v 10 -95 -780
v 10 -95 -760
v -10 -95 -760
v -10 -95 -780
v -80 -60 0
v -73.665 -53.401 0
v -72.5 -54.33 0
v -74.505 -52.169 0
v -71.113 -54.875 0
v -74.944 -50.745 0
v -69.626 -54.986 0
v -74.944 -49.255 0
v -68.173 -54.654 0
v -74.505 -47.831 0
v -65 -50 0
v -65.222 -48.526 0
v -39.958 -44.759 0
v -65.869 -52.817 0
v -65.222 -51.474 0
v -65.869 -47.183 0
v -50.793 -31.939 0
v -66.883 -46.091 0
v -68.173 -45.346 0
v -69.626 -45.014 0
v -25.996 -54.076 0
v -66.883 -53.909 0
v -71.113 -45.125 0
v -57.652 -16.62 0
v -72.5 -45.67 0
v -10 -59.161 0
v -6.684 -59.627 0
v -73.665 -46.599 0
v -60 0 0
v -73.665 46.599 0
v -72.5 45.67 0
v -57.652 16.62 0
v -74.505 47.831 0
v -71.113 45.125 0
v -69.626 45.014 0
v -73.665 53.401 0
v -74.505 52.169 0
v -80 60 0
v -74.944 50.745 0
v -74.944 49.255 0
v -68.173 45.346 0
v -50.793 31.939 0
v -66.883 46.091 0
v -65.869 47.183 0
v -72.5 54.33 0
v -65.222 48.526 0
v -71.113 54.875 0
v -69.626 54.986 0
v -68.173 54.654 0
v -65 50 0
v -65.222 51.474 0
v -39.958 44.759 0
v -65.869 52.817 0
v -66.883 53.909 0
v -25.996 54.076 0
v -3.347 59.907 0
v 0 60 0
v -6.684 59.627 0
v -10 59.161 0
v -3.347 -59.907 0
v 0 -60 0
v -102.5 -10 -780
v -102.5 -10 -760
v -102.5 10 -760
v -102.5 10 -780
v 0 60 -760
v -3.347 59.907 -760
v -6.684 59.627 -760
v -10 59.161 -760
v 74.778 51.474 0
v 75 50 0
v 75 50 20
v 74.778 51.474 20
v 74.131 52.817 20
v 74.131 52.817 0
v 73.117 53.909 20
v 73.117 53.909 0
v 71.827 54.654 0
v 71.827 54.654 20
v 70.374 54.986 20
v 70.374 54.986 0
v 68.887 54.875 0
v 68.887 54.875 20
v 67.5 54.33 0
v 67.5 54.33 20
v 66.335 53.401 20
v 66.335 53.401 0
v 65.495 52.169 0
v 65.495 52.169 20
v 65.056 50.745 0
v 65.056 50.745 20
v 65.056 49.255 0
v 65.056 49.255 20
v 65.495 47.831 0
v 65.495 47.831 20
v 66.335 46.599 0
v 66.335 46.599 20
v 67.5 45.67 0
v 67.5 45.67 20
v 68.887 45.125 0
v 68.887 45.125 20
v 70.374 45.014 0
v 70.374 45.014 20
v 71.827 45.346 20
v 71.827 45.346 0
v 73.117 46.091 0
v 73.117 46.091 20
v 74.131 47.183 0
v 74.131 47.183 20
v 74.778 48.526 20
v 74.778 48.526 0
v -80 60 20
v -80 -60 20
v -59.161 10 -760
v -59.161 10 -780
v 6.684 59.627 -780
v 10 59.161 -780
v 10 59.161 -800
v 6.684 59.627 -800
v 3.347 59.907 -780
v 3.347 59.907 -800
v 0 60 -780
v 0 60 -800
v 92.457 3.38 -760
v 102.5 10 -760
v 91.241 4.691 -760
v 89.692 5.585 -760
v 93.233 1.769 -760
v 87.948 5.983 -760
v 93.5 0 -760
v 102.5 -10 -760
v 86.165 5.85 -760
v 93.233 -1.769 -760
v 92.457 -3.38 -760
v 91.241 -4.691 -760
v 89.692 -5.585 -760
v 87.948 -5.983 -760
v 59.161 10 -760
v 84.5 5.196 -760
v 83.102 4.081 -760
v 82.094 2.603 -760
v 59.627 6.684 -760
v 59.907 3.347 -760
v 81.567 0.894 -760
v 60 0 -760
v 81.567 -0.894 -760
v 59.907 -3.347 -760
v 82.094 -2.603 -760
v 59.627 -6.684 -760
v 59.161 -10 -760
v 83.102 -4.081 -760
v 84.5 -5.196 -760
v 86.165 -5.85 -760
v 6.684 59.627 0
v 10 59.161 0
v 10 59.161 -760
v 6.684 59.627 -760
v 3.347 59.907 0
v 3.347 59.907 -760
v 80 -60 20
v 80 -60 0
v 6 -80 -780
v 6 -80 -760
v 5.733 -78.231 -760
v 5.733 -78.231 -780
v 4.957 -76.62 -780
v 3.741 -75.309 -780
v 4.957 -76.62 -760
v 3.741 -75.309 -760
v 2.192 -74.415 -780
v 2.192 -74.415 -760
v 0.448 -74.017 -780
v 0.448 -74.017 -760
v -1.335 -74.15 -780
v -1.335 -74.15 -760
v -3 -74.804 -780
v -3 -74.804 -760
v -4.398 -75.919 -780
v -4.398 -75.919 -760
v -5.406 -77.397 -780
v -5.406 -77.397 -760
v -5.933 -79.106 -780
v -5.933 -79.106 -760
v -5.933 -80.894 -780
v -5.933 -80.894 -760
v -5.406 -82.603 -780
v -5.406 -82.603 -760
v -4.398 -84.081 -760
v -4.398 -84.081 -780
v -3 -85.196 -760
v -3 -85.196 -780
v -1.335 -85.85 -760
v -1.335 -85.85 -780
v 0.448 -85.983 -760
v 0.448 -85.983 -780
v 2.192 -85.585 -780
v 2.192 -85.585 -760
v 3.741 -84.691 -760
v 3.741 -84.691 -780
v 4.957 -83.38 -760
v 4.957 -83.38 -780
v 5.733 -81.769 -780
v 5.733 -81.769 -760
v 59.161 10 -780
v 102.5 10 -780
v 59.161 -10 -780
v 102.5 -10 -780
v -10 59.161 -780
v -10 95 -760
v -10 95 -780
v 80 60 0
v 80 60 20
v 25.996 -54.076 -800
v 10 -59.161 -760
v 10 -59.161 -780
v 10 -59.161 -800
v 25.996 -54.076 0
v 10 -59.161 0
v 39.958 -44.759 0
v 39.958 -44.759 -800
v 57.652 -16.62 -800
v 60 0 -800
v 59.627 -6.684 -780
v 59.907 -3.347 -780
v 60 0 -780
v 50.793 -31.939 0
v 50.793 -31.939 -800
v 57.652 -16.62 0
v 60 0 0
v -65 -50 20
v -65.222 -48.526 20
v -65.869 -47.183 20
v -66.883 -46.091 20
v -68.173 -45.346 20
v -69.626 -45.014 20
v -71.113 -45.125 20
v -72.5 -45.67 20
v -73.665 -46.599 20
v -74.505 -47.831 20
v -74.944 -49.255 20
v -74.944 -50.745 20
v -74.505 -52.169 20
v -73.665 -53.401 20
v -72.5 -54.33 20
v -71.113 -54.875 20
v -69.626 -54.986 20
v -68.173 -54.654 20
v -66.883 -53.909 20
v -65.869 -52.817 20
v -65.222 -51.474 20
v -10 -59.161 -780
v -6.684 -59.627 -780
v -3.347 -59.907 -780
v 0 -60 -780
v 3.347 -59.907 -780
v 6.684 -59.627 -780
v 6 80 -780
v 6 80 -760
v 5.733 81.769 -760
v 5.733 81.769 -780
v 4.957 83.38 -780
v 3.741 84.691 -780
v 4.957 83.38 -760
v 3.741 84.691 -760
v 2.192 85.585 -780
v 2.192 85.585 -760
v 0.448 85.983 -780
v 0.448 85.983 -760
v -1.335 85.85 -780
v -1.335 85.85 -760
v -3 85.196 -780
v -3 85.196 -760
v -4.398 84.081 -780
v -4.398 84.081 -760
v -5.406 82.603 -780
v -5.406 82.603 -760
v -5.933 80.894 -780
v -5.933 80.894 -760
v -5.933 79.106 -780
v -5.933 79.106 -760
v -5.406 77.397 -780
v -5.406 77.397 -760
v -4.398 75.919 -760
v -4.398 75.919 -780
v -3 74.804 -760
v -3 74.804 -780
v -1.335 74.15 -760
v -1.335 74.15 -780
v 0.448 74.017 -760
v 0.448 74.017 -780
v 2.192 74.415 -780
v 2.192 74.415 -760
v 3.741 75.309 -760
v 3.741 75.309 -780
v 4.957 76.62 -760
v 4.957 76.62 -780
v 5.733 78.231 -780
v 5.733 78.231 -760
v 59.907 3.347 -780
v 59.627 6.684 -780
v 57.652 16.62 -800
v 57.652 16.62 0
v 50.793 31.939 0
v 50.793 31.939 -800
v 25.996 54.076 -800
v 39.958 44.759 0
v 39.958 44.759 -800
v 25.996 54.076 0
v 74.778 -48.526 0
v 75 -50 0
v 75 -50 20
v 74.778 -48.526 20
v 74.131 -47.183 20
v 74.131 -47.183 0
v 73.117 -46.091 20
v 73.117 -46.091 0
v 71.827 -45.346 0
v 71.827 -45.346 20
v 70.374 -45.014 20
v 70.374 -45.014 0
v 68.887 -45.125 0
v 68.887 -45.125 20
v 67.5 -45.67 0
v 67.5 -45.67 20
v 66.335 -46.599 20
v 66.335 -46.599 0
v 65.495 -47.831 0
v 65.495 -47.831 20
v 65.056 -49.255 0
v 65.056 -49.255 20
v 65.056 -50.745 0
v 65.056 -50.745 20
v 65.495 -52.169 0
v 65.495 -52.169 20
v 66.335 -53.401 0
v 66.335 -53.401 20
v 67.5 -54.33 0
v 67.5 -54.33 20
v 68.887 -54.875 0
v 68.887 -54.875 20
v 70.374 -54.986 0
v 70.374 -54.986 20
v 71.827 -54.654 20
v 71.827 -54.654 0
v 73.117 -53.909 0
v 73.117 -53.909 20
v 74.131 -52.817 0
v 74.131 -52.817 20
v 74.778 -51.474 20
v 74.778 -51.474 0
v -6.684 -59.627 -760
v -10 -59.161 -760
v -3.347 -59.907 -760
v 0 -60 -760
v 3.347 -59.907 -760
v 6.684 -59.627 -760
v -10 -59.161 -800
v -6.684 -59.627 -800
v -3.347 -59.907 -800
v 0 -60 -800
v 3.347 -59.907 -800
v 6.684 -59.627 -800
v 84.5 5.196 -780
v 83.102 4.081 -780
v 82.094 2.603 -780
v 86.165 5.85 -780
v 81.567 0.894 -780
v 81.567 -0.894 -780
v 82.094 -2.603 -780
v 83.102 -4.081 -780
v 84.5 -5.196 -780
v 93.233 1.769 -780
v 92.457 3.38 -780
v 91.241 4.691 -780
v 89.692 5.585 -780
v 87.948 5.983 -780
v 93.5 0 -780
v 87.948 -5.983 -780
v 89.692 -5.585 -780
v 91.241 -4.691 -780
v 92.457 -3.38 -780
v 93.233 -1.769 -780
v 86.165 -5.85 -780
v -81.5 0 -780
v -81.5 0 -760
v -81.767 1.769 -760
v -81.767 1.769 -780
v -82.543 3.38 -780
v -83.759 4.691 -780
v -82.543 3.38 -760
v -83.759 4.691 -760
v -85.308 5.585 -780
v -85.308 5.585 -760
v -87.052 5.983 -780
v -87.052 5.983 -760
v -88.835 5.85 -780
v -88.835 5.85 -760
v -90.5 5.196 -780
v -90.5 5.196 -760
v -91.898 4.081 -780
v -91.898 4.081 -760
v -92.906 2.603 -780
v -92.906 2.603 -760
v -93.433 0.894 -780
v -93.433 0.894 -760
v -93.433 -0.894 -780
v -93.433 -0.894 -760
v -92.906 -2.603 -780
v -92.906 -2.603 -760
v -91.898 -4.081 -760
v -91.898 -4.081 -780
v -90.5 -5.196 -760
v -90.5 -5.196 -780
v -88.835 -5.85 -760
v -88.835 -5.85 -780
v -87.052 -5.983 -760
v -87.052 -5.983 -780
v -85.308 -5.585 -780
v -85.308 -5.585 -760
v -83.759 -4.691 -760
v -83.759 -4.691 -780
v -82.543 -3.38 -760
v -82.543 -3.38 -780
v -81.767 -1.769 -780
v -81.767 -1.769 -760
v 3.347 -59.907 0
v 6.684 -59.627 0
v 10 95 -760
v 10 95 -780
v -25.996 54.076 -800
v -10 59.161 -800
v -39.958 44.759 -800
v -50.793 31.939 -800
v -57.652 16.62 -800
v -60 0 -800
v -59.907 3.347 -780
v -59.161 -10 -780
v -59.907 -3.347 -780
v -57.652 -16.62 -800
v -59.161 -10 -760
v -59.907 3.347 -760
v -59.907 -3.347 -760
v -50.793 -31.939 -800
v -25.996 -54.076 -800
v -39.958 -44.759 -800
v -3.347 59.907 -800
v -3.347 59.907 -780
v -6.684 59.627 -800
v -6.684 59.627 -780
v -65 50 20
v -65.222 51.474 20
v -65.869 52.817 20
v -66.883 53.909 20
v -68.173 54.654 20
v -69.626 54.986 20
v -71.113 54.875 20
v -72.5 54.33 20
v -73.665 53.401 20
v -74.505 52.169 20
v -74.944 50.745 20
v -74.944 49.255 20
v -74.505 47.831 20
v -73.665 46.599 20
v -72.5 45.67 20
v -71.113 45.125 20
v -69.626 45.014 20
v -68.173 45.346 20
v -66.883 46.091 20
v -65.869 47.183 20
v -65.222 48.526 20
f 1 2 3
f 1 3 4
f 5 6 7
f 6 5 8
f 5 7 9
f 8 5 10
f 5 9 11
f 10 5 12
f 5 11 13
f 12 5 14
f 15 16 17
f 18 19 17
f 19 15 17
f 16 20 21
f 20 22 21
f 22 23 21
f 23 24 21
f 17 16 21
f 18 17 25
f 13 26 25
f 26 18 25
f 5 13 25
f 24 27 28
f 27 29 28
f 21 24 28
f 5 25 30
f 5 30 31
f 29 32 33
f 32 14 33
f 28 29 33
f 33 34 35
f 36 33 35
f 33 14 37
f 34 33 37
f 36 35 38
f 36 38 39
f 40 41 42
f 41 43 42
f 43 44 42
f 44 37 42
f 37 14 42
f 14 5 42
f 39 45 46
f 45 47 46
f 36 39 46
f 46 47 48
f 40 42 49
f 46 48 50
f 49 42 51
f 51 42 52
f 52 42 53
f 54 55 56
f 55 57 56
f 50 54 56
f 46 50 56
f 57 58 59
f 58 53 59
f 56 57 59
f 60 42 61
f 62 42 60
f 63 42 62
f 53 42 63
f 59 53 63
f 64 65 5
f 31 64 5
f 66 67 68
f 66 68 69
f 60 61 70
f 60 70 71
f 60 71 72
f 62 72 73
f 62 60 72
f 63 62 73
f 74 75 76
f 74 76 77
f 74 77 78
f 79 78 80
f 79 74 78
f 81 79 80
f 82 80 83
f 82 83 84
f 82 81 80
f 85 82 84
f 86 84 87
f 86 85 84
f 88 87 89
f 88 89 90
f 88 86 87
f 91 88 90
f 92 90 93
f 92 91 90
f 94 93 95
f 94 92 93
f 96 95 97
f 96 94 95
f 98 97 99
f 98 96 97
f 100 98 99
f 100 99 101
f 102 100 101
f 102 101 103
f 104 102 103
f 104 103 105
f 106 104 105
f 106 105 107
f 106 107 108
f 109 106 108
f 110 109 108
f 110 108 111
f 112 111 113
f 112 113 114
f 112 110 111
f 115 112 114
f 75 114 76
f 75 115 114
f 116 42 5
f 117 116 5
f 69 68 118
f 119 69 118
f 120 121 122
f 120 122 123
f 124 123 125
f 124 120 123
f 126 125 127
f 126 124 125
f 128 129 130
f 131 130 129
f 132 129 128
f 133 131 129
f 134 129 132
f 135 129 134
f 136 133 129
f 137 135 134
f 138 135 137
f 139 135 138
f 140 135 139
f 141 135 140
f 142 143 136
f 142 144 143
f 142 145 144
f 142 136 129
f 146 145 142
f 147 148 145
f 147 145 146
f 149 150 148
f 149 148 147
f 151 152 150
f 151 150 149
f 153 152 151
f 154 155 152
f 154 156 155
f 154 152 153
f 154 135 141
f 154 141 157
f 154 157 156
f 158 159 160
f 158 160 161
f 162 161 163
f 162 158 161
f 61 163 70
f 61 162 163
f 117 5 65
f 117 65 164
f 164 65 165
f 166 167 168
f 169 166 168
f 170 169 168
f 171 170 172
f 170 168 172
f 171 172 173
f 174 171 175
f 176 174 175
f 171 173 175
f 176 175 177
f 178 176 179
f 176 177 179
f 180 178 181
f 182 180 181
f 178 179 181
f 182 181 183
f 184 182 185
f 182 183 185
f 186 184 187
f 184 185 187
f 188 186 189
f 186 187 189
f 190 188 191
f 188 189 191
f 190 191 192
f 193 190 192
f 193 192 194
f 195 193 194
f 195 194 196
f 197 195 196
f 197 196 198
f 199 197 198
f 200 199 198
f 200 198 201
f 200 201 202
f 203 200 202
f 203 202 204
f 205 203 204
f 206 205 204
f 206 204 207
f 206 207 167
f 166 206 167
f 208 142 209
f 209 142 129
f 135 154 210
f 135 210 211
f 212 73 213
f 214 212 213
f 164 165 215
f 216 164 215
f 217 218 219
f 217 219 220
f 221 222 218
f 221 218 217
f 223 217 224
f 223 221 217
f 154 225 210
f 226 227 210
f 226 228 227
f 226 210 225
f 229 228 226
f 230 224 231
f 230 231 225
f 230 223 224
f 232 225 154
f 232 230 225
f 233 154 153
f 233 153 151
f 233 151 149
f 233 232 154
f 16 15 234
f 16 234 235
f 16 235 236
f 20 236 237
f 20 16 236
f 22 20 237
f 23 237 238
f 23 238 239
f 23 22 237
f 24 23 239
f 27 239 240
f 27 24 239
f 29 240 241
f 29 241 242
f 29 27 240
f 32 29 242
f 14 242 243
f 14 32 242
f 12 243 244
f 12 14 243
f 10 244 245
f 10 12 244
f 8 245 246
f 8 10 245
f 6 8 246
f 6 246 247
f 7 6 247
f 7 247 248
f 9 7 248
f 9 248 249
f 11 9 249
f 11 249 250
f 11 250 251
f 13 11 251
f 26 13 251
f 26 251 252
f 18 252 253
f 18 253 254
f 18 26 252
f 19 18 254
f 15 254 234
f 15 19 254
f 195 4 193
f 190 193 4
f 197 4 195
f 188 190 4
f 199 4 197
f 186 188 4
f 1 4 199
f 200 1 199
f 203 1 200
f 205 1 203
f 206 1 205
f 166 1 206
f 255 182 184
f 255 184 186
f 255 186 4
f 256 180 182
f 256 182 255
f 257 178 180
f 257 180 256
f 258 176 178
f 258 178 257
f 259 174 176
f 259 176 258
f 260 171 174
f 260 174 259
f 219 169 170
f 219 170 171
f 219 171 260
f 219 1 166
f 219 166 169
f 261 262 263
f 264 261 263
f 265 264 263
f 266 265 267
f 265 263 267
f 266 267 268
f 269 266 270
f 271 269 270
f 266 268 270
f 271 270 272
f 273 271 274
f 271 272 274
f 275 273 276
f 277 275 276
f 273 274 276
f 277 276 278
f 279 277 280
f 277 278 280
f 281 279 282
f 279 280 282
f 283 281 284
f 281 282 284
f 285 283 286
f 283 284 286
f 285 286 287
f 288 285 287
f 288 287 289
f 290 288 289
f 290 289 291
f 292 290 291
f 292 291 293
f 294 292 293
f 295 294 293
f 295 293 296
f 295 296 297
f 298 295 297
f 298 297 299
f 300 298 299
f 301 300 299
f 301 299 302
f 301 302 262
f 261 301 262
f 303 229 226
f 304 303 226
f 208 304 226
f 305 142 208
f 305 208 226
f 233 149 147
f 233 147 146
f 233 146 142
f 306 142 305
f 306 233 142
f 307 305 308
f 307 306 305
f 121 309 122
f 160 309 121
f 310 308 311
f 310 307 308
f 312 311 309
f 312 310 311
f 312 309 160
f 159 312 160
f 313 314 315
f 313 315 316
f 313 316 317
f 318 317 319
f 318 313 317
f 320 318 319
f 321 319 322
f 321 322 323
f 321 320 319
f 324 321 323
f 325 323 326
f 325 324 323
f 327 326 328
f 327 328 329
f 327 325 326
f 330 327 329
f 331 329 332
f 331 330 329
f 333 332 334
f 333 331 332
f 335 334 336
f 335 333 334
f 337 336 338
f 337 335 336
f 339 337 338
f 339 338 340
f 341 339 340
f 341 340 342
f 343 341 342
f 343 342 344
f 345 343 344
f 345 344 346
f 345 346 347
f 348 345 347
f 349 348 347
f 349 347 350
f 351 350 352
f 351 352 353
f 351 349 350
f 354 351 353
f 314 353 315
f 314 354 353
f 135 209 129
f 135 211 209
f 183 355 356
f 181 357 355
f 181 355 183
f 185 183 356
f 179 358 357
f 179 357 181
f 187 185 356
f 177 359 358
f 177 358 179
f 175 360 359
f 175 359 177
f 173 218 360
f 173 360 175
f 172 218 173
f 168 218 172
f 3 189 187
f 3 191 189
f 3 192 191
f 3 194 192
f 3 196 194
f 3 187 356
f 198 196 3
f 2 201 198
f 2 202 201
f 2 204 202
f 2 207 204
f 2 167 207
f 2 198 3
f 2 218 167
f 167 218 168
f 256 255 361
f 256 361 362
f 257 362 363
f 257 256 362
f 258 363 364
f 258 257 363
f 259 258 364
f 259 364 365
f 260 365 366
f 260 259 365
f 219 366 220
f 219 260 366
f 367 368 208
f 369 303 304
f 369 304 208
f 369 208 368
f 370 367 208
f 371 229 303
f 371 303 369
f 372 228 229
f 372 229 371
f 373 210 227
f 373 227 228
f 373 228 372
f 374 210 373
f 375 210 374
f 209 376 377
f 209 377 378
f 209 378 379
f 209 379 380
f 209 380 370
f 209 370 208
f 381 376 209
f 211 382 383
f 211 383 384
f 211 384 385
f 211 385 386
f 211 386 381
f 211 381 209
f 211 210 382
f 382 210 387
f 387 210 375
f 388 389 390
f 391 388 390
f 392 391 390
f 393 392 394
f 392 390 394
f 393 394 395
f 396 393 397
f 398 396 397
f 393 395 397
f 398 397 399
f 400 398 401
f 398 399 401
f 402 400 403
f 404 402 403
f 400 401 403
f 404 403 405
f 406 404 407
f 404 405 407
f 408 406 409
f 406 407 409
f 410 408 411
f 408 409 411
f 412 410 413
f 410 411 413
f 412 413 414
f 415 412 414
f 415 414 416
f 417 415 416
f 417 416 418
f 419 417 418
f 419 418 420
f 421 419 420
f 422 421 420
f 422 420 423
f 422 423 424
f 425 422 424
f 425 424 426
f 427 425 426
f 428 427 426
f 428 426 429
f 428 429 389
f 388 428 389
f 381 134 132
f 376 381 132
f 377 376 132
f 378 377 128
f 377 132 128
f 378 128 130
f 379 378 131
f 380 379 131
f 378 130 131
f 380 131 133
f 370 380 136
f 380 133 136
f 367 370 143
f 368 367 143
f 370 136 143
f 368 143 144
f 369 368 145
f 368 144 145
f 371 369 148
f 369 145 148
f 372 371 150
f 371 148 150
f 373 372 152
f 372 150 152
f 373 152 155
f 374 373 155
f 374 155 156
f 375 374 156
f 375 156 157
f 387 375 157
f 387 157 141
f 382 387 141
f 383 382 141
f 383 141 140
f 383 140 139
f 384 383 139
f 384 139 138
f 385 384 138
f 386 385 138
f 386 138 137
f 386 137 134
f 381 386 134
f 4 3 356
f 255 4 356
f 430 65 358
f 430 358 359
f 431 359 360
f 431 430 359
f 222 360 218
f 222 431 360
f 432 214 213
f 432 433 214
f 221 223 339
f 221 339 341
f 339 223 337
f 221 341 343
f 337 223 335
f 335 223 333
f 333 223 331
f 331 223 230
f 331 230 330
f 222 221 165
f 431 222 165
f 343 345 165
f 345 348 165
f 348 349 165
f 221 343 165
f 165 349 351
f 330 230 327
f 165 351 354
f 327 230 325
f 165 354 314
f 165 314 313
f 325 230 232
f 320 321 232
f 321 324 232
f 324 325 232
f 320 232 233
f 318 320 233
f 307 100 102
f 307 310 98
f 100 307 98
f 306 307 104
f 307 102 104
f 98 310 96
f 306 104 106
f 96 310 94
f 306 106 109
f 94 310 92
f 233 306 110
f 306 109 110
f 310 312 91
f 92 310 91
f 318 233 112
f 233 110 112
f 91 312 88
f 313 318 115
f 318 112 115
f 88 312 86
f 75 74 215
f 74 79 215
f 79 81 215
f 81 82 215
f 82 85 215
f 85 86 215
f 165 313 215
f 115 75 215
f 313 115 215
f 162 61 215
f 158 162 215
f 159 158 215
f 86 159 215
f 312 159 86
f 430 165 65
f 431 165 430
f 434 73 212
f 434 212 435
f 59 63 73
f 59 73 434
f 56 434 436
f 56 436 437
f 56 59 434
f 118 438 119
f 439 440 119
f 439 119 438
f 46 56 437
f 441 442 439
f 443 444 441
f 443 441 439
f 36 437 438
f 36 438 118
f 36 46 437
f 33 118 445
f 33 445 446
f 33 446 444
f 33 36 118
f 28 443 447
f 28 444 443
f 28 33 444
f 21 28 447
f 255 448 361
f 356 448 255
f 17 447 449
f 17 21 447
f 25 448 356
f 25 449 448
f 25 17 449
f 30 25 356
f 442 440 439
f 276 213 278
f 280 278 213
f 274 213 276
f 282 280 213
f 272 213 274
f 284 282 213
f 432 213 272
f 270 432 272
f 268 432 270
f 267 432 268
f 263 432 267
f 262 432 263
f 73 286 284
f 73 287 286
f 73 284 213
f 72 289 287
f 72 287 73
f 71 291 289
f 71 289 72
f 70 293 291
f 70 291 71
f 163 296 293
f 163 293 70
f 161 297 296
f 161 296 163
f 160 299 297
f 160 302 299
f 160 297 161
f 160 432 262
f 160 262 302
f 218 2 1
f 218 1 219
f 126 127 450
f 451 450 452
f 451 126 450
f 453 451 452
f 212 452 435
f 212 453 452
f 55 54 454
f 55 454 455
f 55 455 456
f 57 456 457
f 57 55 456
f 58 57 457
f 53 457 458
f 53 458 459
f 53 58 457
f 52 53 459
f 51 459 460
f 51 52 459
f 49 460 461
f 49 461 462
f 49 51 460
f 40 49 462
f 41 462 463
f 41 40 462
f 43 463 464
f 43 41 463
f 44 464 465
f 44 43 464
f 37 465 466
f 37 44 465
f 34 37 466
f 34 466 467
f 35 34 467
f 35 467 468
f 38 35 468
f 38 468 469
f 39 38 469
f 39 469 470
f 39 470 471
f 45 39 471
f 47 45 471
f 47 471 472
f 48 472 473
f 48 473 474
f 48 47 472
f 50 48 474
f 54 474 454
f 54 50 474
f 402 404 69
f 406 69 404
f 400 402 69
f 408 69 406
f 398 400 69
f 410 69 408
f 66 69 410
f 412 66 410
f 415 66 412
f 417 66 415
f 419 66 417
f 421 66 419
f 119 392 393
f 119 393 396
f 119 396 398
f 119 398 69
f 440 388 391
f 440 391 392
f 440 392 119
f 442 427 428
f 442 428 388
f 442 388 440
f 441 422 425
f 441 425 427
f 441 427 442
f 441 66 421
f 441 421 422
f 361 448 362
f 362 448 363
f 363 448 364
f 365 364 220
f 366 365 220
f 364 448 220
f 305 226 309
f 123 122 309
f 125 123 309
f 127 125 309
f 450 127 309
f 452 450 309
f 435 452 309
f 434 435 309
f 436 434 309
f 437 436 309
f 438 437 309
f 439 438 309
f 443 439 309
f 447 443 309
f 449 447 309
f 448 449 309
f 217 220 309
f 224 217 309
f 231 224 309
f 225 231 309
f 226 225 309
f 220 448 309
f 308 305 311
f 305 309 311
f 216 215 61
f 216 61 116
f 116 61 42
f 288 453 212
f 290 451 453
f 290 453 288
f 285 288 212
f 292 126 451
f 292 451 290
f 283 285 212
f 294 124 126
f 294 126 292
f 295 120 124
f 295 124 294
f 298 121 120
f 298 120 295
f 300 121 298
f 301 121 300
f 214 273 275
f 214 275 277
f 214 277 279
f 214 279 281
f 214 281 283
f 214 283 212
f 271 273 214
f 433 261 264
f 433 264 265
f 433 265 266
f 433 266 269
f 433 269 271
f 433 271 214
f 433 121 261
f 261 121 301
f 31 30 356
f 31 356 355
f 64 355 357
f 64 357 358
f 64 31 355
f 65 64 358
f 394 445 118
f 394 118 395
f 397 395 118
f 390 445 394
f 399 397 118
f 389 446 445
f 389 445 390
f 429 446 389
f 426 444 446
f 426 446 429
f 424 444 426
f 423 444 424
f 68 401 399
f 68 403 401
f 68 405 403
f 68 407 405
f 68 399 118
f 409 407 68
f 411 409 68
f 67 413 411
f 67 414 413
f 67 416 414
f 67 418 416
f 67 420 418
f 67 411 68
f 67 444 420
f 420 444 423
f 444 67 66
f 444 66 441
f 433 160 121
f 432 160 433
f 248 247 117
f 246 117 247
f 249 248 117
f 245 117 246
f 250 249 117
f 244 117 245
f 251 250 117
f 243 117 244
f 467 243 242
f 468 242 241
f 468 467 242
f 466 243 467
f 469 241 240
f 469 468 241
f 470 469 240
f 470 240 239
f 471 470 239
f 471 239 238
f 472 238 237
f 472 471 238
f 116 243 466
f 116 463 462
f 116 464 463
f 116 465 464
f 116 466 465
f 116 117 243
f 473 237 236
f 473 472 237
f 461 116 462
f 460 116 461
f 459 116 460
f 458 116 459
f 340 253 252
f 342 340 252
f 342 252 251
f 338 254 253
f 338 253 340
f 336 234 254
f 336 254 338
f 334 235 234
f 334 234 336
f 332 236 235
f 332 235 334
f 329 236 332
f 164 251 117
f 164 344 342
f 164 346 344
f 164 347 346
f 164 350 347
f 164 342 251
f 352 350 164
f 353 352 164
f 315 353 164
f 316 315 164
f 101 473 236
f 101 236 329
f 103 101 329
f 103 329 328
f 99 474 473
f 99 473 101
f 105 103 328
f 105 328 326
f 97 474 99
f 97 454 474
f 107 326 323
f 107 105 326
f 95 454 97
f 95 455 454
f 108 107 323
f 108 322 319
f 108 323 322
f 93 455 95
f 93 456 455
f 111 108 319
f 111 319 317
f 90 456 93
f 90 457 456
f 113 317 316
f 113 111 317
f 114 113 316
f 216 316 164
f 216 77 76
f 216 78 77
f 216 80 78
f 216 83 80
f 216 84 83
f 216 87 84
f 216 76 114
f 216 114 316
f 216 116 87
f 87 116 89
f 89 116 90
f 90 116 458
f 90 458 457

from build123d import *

# Parameters (mm, degrees)
F0_R     = 5
F1_DEPTH = 20
F2_DEPTH = 800
F5_DEPTH = 10
F6_DEPTH = 10
F0_R_2   = 6
F7_DEPTH = 956


# Not quite as in the source:
# - a feature names something its author has since deleted; it is built from what else it names


with BuildPart() as f1:
    # F0 (on Top) → F1 (new body)
    with BuildSketch(Plane.XY):
        with BuildLine():
            ThreePointArc((-59.160797831, 10), (-42.4264068712, 42.4264068712), (-10, 59.160797831))
            Line((-10, 59.160797831), (-10, 60))
            Line((-10, 60), (-80, 60))
            Line((-80, 60), (-80, 10))
            Line((-80, 10), (-59.160797831, 10))
        make_face()
        with Locations((-70, 50)):
            Circle(F0_R, mode=Mode.SUBTRACT)
        with BuildLine():
            ThreePointArc((59.160797831, -10), (59.7898313673, -5.0175756168), (60, 0))
            ThreePointArc((60, 0), (59.7898313673, 5.0175756168), (59.160797831, 10))
            ThreePointArc((59.160797831, 10), (42.4264068712, 42.4264068712), (10, 59.160797831))
            ThreePointArc((10, 59.160797831), (5.0175756193, 59.7898313671), (5e-09, 60))
            ThreePointArc((5e-09, 60), (-5.0175756143, 59.7898313675), (-10, 59.160797831))
            ThreePointArc((-10, 59.160797831), (-42.4264068712, 42.4264068712), (-59.160797831, 10))
            ThreePointArc((-59.160797831, 10), (-60, 0), (-59.160797831, -10))
            ThreePointArc((-59.160797831, -10), (-42.4264068712, -42.4264068712), (-10, -59.160797831))
            ThreePointArc((-10, -59.160797831), (-5.0175756489, -59.7898313646), (-6.44e-08, -60))
            ThreePointArc((-6.44e-08, -60), (5.0175755847, -59.78983137), (10, -59.160797831))
            ThreePointArc((10, -59.160797831), (42.4264068712, -42.4264068712), (59.160797831, -10))
        make_face()
        with BuildLine():
            ThreePointArc((10, 59.160797831), (42.4264068712, 42.4264068712), (59.160797831, 10))
            Line((59.160797831, 10), (80, 10))
            Line((80, 10), (80, 60))
            Line((80, 60), (10, 60))
            Line((10, 60), (10, 59.160797831))
        make_face()
        with Locations((70, 50)):
            Circle(F0_R, mode=Mode.SUBTRACT)
        with BuildLine():
            ThreePointArc((59.160797831, 10), (59.7898313673, 5.0175756168), (60, 0))
            ThreePointArc((60, 0), (59.7898313673, -5.0175756168), (59.160797831, -10))
            Line((59.160797831, -10), (80, -10))
            Line((80, -10), (80, 10))
            Line((80, 10), (59.160797831, 10))
        make_face()
        with BuildLine():
            Line((80, -10), (59.160797831, -10))
            ThreePointArc((59.160797831, -10), (42.4264068712, -42.4264068712), (10, -59.160797831))
            Line((10, -59.160797831), (10, -60))
            Line((10, -60), (80, -60))
            Line((80, -60), (80, -10))
        make_face()
        with Locations((70, -50)):
            Circle(F0_R, mode=Mode.SUBTRACT)
        with BuildLine():
            ThreePointArc((-59.160797831, -10), (-60, 0), (-59.160797831, 10))
            Line((-59.160797831, 10), (-80, 10))
            Line((-80, 10), (-80, -10))
            Line((-80, -10), (-59.160797831, -10))
        make_face()
        with BuildLine():
            Line((-10, -60), (-10, -59.160797831))
            ThreePointArc((-10, -59.160797831), (-42.4264068712, -42.4264068712), (-59.160797831, -10))
            Line((-59.160797831, -10), (-80, -10))
            Line((-80, -10), (-80, -60))
            Line((-80, -60), (-10, -60))
        make_face()
        with Locations((-70, -50)):
            Circle(F0_R, mode=Mode.SUBTRACT)
        with BuildLine():
            Line((-10, -60), (-6.44e-08, -60))
            ThreePointArc((-6.44e-08, -60), (-5.0175756489, -59.7898313646), (-10, -59.160797831))
            Line((-10, -59.160797831), (-10, -60))
        make_face()
        with BuildLine():
            Line((10, -60), (10, -59.160797831))
            ThreePointArc((10, -59.160797831), (5.0175755847, -59.78983137), (-6.44e-08, -60))
            Line((-6.44e-08, -60), (10, -60))
        make_face()
        with BuildLine():
            ThreePointArc((-10, 59.160797831), (-5.0175756143, 59.7898313675), (5e-09, 60))
            Line((5e-09, 60), (-10, 60))
            Line((-10, 60), (-10, 59.160797831))
        make_face()
        with BuildLine():
            ThreePointArc((5e-09, 60), (5.0175756193, 59.7898313671), (10, 59.160797831))
            Line((10, 59.160797831), (10, 60))
            Line((10, 60), (5e-09, 60))
        make_face()
    extrude(amount=F1_DEPTH)

    # F0 (on Top) → F2 (join)
    with BuildSketch(Plane.XY):
        with BuildLine():
            ThreePointArc((59.160797831, -10), (59.7898313673, -5.0175756168), (60, 0))
            ThreePointArc((60, 0), (59.7898313673, 5.0175756168), (59.160797831, 10))
            ThreePointArc((59.160797831, 10), (42.4264068712, 42.4264068712), (10, 59.160797831))
            ThreePointArc((10, 59.160797831), (5.0175756193, 59.7898313671), (5e-09, 60))
            ThreePointArc((5e-09, 60), (-5.0175756143, 59.7898313675), (-10, 59.160797831))
            ThreePointArc((-10, 59.160797831), (-42.4264068712, 42.4264068712), (-59.160797831, 10))
            ThreePointArc((-59.160797831, 10), (-60, 0), (-59.160797831, -10))
            ThreePointArc((-59.160797831, -10), (-42.4264068712, -42.4264068712), (-10, -59.160797831))
            ThreePointArc((-10, -59.160797831), (-5.0175756489, -59.7898313646), (-6.44e-08, -60))
            ThreePointArc((-6.44e-08, -60), (5.0175755847, -59.78983137), (10, -59.160797831))
            ThreePointArc((10, -59.160797831), (42.4264068712, -42.4264068712), (59.160797831, -10))
        make_face()
    extrude(amount=-F2_DEPTH)

    # F4 (on Right) → F5 (join, symmetric)
    with BuildSketch(Plane.YZ):
        Polygon((95, -760), (0, -760), (-95, -760), (-95, -780), (95, -780), align=None)
    extrude(amount=F5_DEPTH, both=True)

    # F3 (on Front) → F6 (join, symmetric)
    with BuildSketch(Plane.XZ):
        Polygon((102.5, -760), (0, -760), (-102.5, -760), (-102.5, -780), (102.5, -780), align=None)
    extrude(amount=F6_DEPTH, both=True)

    # F0 (on Top) → F7 (cut)
    with BuildSketch(Plane.XY):
        with Locations((0, 80)):
            Circle(F0_R_2)
        with Locations((0, -80)):
            Circle(F0_R_2)
        with Locations((87.5, 0)):
            Circle(F0_R_2)
        with Locations((-87.5, 0)):
            Circle(F0_R_2)
    extrude(amount=-F7_DEPTH, mode=Mode.SUBTRACT)


solid = f1.part
